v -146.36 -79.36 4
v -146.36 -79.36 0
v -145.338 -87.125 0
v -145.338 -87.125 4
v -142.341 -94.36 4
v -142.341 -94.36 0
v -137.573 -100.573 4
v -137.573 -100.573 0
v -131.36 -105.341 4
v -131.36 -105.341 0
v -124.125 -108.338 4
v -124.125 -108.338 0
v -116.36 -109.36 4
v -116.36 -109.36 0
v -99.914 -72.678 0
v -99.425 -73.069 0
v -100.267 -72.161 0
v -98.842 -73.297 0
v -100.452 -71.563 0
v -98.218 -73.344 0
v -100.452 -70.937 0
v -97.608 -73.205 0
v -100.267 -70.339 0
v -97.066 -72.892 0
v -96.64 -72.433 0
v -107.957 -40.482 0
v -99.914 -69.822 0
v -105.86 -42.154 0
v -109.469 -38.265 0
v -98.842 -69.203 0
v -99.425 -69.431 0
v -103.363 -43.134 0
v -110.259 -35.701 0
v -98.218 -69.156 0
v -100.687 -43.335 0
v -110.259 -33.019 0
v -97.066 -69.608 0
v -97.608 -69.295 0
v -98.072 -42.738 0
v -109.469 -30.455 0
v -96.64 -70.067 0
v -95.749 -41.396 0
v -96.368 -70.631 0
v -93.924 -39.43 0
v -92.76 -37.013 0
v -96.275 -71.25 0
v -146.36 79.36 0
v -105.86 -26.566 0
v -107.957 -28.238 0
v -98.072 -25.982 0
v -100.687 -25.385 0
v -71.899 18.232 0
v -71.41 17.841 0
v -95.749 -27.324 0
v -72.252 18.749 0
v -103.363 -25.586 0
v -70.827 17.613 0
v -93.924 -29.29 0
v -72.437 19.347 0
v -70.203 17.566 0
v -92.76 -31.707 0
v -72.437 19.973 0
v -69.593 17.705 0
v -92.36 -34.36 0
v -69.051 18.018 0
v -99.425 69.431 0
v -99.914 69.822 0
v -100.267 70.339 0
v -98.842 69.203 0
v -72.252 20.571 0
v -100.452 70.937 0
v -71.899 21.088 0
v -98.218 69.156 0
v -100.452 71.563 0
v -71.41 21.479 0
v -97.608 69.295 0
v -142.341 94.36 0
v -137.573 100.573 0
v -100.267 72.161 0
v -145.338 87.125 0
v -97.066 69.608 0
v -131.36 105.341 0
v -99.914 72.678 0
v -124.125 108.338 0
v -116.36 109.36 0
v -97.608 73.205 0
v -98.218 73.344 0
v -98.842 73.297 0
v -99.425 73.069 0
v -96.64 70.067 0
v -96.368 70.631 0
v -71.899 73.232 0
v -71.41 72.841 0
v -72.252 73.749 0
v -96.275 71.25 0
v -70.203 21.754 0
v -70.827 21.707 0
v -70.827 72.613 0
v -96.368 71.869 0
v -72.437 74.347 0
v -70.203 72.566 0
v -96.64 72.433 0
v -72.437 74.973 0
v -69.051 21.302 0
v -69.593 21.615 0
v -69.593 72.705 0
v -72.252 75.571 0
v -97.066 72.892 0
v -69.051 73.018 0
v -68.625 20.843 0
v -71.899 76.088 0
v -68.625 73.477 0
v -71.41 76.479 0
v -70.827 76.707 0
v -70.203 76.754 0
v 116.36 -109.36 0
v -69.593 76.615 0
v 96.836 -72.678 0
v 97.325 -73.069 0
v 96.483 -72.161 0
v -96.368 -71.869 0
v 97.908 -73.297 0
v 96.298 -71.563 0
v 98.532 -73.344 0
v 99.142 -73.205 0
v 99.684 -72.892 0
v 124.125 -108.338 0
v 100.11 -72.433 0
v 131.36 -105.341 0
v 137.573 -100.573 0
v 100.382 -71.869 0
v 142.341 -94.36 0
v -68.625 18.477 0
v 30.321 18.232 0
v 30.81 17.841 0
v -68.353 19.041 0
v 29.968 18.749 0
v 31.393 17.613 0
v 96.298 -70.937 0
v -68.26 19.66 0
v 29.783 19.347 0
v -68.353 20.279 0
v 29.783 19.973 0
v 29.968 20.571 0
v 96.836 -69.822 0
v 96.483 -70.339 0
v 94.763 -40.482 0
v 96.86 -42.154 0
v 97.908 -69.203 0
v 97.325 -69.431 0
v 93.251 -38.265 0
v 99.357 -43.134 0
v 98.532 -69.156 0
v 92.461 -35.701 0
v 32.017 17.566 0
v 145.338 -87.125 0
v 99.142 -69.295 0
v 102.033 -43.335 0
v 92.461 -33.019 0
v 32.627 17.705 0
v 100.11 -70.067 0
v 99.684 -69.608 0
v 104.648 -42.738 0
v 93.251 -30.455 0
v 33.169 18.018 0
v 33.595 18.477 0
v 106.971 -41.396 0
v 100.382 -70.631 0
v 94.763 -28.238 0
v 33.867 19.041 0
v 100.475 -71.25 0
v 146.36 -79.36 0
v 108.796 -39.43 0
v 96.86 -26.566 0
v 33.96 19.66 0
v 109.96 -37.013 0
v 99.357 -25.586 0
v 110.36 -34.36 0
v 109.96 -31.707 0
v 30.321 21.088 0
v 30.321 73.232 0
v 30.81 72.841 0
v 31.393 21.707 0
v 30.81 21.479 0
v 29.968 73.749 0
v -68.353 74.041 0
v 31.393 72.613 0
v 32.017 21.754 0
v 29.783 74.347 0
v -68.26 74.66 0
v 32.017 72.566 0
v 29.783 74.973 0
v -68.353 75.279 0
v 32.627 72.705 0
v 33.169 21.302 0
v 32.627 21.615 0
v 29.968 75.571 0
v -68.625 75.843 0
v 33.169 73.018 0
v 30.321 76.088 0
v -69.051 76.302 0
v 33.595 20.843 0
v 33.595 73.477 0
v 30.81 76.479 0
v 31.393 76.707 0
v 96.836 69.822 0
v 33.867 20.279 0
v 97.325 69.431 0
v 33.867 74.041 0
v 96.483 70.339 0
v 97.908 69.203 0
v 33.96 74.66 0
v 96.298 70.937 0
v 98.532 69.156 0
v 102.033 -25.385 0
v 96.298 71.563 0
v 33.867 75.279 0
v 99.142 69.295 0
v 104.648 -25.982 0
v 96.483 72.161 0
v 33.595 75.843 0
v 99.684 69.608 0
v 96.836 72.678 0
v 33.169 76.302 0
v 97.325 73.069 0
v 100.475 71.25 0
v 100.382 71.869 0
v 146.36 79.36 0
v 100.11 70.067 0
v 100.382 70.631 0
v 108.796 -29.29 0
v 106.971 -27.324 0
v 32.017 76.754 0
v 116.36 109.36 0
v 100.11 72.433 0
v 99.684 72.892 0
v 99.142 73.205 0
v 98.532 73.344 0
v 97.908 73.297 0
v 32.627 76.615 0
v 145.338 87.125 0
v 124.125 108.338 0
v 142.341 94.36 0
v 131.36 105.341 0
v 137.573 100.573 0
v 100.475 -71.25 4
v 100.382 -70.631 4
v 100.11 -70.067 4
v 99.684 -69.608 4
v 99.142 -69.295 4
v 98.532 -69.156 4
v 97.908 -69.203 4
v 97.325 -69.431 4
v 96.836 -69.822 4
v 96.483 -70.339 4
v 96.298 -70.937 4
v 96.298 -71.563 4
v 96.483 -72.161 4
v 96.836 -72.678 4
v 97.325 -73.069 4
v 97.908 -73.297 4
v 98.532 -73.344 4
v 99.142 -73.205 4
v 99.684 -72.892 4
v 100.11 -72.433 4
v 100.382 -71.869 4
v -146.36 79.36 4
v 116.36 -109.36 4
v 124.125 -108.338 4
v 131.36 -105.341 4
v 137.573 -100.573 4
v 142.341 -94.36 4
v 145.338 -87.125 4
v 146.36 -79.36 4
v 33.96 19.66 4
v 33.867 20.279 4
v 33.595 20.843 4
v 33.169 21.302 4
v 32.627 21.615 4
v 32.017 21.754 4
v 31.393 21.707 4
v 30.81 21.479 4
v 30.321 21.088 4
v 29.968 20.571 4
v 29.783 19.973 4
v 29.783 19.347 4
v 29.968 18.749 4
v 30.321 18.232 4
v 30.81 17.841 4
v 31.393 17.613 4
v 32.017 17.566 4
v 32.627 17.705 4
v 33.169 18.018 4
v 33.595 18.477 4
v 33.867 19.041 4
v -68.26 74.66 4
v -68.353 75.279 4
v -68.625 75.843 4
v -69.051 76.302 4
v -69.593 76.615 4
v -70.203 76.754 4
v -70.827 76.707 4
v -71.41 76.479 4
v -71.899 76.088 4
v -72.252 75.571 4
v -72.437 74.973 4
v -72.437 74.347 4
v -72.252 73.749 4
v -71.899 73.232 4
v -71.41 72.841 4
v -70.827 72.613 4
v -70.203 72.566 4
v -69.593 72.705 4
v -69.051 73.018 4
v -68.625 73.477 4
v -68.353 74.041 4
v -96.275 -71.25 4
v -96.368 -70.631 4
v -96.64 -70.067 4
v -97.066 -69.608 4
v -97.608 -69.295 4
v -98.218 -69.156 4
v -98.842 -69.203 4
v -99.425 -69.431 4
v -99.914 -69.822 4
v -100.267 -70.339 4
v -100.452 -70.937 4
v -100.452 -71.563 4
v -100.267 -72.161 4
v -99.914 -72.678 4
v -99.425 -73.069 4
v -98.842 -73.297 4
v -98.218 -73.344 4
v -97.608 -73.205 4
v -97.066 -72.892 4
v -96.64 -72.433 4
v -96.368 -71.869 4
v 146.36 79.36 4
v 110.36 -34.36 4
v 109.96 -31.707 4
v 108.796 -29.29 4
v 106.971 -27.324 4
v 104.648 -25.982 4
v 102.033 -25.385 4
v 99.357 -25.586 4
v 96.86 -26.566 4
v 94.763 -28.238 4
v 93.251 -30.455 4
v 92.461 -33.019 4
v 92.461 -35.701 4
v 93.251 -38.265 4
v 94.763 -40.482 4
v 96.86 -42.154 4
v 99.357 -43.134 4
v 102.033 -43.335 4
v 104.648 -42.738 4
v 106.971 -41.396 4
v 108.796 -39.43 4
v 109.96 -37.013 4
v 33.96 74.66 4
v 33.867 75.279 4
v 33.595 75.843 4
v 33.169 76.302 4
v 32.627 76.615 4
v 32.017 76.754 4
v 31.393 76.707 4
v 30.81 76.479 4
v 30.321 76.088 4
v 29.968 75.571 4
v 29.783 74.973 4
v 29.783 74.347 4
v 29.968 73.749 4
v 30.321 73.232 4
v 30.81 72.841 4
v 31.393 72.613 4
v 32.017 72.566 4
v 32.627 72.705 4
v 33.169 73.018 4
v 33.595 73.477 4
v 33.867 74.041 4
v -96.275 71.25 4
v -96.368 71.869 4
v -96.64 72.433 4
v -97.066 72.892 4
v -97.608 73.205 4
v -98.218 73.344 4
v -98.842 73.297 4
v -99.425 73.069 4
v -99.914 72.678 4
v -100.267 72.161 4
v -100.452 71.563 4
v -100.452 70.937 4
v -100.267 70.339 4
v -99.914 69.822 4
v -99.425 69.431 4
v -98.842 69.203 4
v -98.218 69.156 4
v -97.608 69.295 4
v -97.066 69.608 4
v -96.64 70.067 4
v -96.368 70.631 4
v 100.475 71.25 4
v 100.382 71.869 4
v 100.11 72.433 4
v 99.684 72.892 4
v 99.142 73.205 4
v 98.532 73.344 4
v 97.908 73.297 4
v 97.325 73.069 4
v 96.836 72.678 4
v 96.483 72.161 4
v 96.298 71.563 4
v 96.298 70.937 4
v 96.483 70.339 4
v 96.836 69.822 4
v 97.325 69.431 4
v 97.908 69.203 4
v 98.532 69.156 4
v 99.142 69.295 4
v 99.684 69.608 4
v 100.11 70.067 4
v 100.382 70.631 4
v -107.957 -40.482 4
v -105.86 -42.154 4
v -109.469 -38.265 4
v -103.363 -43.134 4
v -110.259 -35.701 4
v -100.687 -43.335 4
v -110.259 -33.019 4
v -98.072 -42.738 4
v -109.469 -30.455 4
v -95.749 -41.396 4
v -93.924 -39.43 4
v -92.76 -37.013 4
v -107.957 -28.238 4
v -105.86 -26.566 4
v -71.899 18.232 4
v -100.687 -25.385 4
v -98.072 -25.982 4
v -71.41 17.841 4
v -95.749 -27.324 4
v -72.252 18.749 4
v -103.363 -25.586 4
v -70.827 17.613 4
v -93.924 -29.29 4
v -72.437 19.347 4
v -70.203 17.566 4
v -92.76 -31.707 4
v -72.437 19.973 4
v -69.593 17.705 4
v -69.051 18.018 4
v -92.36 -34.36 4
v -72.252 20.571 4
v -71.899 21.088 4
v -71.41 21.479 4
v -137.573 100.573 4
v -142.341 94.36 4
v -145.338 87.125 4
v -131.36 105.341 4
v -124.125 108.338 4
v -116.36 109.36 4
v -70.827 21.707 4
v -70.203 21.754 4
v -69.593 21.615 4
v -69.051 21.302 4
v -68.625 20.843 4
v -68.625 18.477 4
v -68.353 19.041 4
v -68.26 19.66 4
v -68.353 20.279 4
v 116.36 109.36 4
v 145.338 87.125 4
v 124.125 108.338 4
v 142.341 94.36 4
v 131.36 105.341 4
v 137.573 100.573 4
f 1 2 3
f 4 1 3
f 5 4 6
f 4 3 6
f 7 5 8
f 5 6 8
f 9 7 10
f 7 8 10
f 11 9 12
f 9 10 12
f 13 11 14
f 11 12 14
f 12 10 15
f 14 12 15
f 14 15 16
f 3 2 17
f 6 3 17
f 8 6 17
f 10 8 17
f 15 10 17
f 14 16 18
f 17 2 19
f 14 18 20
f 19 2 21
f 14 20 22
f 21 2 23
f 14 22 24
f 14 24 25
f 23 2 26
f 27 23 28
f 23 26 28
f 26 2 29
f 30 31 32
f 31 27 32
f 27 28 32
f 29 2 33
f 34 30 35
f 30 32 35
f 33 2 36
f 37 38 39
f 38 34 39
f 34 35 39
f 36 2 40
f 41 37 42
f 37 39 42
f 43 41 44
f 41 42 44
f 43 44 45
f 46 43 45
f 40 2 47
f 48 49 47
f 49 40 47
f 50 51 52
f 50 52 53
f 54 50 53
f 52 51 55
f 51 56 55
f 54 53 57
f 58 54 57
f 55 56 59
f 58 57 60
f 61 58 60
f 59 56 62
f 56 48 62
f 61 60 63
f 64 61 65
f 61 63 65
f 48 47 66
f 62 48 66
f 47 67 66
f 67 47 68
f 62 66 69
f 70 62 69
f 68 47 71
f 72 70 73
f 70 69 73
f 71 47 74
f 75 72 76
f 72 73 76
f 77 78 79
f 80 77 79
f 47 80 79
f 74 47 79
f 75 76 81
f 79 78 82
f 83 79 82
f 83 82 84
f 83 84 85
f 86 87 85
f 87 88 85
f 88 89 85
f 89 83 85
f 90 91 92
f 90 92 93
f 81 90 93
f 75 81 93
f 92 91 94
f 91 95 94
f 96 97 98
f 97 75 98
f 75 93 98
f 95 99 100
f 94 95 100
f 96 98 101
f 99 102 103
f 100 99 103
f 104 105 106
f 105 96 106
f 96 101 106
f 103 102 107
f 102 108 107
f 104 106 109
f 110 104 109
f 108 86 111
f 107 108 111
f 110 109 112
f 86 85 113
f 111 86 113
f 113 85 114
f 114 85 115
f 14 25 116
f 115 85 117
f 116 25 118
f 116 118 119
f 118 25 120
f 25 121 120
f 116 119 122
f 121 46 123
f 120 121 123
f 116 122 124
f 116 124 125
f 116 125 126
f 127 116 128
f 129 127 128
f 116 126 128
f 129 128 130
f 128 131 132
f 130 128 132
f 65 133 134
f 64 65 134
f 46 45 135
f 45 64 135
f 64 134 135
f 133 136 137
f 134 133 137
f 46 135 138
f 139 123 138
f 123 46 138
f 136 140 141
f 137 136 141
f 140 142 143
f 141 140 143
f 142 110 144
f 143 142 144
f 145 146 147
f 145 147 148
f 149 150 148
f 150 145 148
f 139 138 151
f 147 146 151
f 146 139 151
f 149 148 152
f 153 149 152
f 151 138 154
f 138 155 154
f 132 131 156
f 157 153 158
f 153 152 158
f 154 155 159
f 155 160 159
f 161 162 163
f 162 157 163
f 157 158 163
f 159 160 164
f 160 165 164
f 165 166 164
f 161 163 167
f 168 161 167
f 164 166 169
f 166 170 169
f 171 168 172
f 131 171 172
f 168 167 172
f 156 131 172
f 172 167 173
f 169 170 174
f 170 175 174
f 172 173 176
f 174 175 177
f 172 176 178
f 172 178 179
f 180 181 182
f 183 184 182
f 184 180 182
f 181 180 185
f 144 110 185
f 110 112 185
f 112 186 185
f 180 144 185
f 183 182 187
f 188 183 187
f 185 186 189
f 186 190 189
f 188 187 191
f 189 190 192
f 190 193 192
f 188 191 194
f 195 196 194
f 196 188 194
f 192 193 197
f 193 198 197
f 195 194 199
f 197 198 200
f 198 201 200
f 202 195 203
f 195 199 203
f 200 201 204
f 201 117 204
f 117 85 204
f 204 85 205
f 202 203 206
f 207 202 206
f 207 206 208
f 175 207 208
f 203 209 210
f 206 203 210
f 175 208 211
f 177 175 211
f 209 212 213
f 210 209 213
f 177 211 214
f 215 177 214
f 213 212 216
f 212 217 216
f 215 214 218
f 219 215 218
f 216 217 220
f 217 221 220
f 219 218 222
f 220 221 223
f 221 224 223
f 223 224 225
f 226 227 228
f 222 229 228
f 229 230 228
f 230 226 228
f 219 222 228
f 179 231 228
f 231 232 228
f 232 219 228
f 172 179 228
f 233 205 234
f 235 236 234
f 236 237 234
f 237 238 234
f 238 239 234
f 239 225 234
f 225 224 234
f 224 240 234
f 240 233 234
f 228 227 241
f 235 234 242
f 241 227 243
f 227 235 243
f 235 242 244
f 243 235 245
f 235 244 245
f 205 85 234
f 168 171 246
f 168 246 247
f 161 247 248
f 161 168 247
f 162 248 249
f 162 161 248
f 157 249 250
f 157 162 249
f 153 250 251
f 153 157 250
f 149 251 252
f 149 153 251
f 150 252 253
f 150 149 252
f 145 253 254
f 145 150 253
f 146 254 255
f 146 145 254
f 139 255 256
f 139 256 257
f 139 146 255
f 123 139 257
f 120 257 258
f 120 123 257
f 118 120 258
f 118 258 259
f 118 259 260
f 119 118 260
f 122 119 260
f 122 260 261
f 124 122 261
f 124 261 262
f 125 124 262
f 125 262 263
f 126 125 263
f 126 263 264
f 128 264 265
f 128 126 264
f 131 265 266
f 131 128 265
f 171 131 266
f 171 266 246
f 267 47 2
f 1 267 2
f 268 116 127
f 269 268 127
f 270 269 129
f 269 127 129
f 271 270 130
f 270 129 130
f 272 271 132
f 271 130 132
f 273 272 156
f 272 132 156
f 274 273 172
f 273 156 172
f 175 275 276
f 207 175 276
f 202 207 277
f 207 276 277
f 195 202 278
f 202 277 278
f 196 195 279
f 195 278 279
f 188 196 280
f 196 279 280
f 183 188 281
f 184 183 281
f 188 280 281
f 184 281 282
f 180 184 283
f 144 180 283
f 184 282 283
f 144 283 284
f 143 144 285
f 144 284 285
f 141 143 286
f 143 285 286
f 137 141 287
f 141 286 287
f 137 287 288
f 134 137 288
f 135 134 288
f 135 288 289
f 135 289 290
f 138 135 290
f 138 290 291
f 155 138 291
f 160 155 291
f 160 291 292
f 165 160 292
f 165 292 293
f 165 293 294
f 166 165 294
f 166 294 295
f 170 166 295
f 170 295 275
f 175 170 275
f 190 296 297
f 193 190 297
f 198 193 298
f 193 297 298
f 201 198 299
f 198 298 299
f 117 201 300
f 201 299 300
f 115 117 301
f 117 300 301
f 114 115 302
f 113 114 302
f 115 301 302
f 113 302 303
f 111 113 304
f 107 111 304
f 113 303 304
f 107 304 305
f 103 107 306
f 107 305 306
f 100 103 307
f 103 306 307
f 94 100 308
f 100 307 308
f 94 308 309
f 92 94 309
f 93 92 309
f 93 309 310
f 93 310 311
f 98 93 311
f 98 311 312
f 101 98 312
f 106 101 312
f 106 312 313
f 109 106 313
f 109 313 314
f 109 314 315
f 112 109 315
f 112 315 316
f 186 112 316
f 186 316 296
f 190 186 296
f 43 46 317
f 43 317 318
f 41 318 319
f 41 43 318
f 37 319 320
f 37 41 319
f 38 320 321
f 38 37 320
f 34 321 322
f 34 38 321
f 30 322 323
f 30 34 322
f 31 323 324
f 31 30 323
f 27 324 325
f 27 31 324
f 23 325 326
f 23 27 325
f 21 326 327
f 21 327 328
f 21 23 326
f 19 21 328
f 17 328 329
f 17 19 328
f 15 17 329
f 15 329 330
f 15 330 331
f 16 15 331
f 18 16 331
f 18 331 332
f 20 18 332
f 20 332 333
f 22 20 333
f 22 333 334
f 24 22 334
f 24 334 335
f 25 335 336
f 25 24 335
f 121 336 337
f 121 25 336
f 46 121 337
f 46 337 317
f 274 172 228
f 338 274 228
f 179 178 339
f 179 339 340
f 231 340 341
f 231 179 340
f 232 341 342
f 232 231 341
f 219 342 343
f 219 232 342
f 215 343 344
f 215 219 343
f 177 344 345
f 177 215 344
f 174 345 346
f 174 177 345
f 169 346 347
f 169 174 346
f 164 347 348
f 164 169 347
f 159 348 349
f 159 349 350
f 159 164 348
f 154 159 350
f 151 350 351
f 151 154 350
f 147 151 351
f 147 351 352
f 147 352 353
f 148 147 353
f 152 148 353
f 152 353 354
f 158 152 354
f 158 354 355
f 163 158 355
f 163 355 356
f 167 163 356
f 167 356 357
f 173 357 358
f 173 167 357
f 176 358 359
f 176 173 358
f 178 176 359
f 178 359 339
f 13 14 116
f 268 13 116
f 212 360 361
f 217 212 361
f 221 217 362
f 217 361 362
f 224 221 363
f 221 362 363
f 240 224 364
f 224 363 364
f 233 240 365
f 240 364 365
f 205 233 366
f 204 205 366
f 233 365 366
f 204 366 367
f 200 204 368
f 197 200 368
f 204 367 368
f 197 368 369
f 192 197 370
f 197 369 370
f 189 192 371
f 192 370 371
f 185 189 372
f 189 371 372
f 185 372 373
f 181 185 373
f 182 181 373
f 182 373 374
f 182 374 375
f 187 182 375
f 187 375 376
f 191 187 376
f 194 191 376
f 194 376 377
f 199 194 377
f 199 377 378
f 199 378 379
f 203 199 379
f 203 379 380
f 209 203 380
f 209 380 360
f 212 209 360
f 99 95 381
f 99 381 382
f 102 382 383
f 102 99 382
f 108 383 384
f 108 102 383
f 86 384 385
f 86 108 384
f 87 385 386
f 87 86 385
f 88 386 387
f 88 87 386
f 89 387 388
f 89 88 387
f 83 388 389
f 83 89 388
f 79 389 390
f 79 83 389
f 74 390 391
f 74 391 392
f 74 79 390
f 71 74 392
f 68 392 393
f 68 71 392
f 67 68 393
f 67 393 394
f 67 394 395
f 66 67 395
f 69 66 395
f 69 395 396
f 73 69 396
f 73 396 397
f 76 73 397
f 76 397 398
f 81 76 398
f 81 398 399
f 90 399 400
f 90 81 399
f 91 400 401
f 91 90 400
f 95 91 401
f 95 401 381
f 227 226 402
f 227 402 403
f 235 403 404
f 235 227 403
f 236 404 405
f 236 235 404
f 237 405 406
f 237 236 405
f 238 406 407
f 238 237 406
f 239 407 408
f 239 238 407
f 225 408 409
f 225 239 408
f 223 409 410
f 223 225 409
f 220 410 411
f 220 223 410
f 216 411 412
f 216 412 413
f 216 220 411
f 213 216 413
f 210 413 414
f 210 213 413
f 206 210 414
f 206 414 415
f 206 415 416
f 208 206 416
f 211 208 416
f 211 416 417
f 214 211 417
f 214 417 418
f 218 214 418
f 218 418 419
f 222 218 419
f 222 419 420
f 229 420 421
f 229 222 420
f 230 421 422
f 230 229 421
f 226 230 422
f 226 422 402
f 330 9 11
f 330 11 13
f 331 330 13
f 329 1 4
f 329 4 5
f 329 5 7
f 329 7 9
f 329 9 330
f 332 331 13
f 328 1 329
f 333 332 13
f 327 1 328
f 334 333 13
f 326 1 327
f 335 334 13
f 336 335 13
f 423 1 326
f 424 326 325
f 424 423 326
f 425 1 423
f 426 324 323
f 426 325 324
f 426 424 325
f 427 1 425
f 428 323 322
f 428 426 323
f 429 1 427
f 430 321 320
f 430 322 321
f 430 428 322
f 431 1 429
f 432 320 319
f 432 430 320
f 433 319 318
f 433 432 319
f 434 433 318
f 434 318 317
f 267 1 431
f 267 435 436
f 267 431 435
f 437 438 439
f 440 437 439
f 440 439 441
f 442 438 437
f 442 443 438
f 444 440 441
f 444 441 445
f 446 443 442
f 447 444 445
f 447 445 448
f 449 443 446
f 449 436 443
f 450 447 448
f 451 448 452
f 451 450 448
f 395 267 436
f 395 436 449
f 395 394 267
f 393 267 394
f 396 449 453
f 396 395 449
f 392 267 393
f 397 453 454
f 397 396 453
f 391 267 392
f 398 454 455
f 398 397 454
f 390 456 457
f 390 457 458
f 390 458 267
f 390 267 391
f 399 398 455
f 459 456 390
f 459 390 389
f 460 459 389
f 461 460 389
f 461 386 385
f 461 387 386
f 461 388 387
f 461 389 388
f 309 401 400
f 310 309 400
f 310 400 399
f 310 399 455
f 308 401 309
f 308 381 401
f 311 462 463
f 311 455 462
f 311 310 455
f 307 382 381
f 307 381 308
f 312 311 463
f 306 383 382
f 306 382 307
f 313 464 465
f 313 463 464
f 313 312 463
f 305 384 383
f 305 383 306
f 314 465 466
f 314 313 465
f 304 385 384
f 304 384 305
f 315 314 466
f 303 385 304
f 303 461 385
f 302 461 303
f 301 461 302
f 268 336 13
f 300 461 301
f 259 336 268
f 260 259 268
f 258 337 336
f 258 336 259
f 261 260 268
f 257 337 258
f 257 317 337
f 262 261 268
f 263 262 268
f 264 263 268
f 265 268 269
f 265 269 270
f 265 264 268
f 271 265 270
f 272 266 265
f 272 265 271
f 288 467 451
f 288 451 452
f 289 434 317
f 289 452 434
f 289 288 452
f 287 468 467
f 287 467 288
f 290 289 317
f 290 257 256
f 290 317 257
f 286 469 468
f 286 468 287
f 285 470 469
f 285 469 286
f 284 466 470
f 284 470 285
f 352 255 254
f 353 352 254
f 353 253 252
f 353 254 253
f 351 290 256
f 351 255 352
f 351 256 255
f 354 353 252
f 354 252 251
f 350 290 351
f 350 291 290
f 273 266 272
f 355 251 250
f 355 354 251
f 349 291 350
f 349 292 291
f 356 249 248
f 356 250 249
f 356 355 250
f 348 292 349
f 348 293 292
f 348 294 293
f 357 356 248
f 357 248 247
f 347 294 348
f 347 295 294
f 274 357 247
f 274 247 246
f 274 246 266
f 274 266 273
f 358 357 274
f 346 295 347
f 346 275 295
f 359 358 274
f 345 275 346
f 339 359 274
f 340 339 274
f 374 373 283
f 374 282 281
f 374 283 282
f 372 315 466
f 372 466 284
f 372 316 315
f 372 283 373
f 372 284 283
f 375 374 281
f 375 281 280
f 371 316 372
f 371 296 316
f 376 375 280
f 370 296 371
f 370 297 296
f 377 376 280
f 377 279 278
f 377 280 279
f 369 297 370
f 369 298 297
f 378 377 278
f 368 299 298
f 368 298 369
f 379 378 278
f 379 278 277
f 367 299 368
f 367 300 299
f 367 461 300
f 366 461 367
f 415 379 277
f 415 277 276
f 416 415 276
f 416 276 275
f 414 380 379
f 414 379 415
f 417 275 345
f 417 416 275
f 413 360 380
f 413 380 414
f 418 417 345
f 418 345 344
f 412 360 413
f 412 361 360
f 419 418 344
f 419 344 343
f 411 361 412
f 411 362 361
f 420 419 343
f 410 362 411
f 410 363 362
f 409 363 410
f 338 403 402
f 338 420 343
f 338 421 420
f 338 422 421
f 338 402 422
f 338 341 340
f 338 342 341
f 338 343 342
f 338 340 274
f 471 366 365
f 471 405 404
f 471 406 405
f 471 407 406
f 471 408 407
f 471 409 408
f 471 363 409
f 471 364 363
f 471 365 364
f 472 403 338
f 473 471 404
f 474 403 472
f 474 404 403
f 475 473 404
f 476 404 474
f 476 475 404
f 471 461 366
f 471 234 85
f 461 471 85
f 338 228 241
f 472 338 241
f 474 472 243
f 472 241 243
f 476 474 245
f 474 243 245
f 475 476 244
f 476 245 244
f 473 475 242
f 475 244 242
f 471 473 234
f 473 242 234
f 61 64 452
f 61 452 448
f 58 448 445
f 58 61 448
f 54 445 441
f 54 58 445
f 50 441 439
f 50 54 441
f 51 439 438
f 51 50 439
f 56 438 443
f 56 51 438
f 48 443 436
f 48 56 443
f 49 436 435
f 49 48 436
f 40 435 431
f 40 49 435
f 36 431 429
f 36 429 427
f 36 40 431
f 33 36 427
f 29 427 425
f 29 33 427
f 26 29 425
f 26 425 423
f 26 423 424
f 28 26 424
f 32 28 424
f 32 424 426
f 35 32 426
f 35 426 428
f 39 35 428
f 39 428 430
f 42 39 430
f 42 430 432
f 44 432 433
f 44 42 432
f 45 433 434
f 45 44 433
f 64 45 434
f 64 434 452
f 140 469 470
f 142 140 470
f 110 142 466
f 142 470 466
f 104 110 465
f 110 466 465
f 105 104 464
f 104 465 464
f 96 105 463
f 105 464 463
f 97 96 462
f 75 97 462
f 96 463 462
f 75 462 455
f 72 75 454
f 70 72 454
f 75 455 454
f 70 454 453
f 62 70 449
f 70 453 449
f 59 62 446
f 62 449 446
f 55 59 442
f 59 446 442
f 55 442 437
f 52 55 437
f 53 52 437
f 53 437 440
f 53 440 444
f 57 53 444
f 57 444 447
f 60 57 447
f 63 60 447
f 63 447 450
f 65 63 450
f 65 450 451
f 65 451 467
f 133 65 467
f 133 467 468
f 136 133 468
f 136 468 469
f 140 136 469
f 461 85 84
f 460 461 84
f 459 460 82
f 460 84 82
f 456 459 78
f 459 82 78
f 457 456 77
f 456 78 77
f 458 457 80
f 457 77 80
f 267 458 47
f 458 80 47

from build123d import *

# Parameters (mm, degrees)
SKETCH1_R           = 9
SKETCH1_R_2         = 2.1
BOSS_EXTRUDE1_DEPTH = 4
SKETCH2_R           = 2.1
CUT_EXTRUDE1_DEPTH  = 183.748067126


with BuildPart() as part:
    # Sketch1 → Boss-Extrude1 (new body)
    with BuildSketch(Plane.XY):
        with BuildLine():
            Line((-116.359993818, -109.359993818), (116.359993818, -109.359993818))
            ThreePointArc((116.359993818, -109.359993818), (137.573197254, -100.573197254), (146.359993818, -79.359993818))
            Line((146.359993818, -79.359993818), (146.359993818, 79.359993818))
            ThreePointArc((146.359993818, 79.359993818), (137.573197254, 100.573197254), (116.359993818, 109.359993818))
            Line((116.359993818, 109.359993818), (-116.359993818, 109.359993818))
            ThreePointArc((-116.359993818, 109.359993818), (-137.573197254, 100.573197254), (-146.359993818, 79.359993818))
            Line((-146.359993818, 79.359993818), (-146.359993818, -79.359993818))
            ThreePointArc((-146.359993818, -79.359993818), (-137.573197254, -100.573197254), (-116.359993818, -109.359993818))
        make_face()
        with Locations((-101.359993818, -34.359993818)):
            Circle(SKETCH1_R, mode=Mode.SUBTRACT)
        with Locations((101.359993818, -34.359993818)):
            Circle(SKETCH1_R, mode=Mode.SUBTRACT)
        with Locations((-98.375, 71.25)):
            Circle(SKETCH1_R_2, mode=Mode.SUBTRACT)
        with Locations((98.375, 71.25)):
            Circle(SKETCH1_R_2, mode=Mode.SUBTRACT)
        with Locations((98.375, -71.25)):
            Circle(SKETCH1_R_2, mode=Mode.SUBTRACT)
        with Locations((-98.375, -71.25)):
            Circle(SKETCH1_R_2, mode=Mode.SUBTRACT)
    extrude(amount=BOSS_EXTRUDE1_DEPTH)

    # Sketch2 → Cut-Extrude1 (cut, through all)
    with BuildSketch(Plane.XY.offset(4)):
        with Locations((-70.359993818, 74.659993818)):
            Circle(SKETCH2_R)
        with Locations((-70.359993818, 19.659993818)):
            Circle(SKETCH2_R)
        with Locations((31.859993818, 74.659993818)):
            Circle(SKETCH2_R)
        with Locations((31.859993818, 19.659993818)):
            Circle(SKETCH2_R)
    extrude(amount=-CUT_EXTRUDE1_DEPTH, mode=Mode.SUBTRACT)


solid = part.part
